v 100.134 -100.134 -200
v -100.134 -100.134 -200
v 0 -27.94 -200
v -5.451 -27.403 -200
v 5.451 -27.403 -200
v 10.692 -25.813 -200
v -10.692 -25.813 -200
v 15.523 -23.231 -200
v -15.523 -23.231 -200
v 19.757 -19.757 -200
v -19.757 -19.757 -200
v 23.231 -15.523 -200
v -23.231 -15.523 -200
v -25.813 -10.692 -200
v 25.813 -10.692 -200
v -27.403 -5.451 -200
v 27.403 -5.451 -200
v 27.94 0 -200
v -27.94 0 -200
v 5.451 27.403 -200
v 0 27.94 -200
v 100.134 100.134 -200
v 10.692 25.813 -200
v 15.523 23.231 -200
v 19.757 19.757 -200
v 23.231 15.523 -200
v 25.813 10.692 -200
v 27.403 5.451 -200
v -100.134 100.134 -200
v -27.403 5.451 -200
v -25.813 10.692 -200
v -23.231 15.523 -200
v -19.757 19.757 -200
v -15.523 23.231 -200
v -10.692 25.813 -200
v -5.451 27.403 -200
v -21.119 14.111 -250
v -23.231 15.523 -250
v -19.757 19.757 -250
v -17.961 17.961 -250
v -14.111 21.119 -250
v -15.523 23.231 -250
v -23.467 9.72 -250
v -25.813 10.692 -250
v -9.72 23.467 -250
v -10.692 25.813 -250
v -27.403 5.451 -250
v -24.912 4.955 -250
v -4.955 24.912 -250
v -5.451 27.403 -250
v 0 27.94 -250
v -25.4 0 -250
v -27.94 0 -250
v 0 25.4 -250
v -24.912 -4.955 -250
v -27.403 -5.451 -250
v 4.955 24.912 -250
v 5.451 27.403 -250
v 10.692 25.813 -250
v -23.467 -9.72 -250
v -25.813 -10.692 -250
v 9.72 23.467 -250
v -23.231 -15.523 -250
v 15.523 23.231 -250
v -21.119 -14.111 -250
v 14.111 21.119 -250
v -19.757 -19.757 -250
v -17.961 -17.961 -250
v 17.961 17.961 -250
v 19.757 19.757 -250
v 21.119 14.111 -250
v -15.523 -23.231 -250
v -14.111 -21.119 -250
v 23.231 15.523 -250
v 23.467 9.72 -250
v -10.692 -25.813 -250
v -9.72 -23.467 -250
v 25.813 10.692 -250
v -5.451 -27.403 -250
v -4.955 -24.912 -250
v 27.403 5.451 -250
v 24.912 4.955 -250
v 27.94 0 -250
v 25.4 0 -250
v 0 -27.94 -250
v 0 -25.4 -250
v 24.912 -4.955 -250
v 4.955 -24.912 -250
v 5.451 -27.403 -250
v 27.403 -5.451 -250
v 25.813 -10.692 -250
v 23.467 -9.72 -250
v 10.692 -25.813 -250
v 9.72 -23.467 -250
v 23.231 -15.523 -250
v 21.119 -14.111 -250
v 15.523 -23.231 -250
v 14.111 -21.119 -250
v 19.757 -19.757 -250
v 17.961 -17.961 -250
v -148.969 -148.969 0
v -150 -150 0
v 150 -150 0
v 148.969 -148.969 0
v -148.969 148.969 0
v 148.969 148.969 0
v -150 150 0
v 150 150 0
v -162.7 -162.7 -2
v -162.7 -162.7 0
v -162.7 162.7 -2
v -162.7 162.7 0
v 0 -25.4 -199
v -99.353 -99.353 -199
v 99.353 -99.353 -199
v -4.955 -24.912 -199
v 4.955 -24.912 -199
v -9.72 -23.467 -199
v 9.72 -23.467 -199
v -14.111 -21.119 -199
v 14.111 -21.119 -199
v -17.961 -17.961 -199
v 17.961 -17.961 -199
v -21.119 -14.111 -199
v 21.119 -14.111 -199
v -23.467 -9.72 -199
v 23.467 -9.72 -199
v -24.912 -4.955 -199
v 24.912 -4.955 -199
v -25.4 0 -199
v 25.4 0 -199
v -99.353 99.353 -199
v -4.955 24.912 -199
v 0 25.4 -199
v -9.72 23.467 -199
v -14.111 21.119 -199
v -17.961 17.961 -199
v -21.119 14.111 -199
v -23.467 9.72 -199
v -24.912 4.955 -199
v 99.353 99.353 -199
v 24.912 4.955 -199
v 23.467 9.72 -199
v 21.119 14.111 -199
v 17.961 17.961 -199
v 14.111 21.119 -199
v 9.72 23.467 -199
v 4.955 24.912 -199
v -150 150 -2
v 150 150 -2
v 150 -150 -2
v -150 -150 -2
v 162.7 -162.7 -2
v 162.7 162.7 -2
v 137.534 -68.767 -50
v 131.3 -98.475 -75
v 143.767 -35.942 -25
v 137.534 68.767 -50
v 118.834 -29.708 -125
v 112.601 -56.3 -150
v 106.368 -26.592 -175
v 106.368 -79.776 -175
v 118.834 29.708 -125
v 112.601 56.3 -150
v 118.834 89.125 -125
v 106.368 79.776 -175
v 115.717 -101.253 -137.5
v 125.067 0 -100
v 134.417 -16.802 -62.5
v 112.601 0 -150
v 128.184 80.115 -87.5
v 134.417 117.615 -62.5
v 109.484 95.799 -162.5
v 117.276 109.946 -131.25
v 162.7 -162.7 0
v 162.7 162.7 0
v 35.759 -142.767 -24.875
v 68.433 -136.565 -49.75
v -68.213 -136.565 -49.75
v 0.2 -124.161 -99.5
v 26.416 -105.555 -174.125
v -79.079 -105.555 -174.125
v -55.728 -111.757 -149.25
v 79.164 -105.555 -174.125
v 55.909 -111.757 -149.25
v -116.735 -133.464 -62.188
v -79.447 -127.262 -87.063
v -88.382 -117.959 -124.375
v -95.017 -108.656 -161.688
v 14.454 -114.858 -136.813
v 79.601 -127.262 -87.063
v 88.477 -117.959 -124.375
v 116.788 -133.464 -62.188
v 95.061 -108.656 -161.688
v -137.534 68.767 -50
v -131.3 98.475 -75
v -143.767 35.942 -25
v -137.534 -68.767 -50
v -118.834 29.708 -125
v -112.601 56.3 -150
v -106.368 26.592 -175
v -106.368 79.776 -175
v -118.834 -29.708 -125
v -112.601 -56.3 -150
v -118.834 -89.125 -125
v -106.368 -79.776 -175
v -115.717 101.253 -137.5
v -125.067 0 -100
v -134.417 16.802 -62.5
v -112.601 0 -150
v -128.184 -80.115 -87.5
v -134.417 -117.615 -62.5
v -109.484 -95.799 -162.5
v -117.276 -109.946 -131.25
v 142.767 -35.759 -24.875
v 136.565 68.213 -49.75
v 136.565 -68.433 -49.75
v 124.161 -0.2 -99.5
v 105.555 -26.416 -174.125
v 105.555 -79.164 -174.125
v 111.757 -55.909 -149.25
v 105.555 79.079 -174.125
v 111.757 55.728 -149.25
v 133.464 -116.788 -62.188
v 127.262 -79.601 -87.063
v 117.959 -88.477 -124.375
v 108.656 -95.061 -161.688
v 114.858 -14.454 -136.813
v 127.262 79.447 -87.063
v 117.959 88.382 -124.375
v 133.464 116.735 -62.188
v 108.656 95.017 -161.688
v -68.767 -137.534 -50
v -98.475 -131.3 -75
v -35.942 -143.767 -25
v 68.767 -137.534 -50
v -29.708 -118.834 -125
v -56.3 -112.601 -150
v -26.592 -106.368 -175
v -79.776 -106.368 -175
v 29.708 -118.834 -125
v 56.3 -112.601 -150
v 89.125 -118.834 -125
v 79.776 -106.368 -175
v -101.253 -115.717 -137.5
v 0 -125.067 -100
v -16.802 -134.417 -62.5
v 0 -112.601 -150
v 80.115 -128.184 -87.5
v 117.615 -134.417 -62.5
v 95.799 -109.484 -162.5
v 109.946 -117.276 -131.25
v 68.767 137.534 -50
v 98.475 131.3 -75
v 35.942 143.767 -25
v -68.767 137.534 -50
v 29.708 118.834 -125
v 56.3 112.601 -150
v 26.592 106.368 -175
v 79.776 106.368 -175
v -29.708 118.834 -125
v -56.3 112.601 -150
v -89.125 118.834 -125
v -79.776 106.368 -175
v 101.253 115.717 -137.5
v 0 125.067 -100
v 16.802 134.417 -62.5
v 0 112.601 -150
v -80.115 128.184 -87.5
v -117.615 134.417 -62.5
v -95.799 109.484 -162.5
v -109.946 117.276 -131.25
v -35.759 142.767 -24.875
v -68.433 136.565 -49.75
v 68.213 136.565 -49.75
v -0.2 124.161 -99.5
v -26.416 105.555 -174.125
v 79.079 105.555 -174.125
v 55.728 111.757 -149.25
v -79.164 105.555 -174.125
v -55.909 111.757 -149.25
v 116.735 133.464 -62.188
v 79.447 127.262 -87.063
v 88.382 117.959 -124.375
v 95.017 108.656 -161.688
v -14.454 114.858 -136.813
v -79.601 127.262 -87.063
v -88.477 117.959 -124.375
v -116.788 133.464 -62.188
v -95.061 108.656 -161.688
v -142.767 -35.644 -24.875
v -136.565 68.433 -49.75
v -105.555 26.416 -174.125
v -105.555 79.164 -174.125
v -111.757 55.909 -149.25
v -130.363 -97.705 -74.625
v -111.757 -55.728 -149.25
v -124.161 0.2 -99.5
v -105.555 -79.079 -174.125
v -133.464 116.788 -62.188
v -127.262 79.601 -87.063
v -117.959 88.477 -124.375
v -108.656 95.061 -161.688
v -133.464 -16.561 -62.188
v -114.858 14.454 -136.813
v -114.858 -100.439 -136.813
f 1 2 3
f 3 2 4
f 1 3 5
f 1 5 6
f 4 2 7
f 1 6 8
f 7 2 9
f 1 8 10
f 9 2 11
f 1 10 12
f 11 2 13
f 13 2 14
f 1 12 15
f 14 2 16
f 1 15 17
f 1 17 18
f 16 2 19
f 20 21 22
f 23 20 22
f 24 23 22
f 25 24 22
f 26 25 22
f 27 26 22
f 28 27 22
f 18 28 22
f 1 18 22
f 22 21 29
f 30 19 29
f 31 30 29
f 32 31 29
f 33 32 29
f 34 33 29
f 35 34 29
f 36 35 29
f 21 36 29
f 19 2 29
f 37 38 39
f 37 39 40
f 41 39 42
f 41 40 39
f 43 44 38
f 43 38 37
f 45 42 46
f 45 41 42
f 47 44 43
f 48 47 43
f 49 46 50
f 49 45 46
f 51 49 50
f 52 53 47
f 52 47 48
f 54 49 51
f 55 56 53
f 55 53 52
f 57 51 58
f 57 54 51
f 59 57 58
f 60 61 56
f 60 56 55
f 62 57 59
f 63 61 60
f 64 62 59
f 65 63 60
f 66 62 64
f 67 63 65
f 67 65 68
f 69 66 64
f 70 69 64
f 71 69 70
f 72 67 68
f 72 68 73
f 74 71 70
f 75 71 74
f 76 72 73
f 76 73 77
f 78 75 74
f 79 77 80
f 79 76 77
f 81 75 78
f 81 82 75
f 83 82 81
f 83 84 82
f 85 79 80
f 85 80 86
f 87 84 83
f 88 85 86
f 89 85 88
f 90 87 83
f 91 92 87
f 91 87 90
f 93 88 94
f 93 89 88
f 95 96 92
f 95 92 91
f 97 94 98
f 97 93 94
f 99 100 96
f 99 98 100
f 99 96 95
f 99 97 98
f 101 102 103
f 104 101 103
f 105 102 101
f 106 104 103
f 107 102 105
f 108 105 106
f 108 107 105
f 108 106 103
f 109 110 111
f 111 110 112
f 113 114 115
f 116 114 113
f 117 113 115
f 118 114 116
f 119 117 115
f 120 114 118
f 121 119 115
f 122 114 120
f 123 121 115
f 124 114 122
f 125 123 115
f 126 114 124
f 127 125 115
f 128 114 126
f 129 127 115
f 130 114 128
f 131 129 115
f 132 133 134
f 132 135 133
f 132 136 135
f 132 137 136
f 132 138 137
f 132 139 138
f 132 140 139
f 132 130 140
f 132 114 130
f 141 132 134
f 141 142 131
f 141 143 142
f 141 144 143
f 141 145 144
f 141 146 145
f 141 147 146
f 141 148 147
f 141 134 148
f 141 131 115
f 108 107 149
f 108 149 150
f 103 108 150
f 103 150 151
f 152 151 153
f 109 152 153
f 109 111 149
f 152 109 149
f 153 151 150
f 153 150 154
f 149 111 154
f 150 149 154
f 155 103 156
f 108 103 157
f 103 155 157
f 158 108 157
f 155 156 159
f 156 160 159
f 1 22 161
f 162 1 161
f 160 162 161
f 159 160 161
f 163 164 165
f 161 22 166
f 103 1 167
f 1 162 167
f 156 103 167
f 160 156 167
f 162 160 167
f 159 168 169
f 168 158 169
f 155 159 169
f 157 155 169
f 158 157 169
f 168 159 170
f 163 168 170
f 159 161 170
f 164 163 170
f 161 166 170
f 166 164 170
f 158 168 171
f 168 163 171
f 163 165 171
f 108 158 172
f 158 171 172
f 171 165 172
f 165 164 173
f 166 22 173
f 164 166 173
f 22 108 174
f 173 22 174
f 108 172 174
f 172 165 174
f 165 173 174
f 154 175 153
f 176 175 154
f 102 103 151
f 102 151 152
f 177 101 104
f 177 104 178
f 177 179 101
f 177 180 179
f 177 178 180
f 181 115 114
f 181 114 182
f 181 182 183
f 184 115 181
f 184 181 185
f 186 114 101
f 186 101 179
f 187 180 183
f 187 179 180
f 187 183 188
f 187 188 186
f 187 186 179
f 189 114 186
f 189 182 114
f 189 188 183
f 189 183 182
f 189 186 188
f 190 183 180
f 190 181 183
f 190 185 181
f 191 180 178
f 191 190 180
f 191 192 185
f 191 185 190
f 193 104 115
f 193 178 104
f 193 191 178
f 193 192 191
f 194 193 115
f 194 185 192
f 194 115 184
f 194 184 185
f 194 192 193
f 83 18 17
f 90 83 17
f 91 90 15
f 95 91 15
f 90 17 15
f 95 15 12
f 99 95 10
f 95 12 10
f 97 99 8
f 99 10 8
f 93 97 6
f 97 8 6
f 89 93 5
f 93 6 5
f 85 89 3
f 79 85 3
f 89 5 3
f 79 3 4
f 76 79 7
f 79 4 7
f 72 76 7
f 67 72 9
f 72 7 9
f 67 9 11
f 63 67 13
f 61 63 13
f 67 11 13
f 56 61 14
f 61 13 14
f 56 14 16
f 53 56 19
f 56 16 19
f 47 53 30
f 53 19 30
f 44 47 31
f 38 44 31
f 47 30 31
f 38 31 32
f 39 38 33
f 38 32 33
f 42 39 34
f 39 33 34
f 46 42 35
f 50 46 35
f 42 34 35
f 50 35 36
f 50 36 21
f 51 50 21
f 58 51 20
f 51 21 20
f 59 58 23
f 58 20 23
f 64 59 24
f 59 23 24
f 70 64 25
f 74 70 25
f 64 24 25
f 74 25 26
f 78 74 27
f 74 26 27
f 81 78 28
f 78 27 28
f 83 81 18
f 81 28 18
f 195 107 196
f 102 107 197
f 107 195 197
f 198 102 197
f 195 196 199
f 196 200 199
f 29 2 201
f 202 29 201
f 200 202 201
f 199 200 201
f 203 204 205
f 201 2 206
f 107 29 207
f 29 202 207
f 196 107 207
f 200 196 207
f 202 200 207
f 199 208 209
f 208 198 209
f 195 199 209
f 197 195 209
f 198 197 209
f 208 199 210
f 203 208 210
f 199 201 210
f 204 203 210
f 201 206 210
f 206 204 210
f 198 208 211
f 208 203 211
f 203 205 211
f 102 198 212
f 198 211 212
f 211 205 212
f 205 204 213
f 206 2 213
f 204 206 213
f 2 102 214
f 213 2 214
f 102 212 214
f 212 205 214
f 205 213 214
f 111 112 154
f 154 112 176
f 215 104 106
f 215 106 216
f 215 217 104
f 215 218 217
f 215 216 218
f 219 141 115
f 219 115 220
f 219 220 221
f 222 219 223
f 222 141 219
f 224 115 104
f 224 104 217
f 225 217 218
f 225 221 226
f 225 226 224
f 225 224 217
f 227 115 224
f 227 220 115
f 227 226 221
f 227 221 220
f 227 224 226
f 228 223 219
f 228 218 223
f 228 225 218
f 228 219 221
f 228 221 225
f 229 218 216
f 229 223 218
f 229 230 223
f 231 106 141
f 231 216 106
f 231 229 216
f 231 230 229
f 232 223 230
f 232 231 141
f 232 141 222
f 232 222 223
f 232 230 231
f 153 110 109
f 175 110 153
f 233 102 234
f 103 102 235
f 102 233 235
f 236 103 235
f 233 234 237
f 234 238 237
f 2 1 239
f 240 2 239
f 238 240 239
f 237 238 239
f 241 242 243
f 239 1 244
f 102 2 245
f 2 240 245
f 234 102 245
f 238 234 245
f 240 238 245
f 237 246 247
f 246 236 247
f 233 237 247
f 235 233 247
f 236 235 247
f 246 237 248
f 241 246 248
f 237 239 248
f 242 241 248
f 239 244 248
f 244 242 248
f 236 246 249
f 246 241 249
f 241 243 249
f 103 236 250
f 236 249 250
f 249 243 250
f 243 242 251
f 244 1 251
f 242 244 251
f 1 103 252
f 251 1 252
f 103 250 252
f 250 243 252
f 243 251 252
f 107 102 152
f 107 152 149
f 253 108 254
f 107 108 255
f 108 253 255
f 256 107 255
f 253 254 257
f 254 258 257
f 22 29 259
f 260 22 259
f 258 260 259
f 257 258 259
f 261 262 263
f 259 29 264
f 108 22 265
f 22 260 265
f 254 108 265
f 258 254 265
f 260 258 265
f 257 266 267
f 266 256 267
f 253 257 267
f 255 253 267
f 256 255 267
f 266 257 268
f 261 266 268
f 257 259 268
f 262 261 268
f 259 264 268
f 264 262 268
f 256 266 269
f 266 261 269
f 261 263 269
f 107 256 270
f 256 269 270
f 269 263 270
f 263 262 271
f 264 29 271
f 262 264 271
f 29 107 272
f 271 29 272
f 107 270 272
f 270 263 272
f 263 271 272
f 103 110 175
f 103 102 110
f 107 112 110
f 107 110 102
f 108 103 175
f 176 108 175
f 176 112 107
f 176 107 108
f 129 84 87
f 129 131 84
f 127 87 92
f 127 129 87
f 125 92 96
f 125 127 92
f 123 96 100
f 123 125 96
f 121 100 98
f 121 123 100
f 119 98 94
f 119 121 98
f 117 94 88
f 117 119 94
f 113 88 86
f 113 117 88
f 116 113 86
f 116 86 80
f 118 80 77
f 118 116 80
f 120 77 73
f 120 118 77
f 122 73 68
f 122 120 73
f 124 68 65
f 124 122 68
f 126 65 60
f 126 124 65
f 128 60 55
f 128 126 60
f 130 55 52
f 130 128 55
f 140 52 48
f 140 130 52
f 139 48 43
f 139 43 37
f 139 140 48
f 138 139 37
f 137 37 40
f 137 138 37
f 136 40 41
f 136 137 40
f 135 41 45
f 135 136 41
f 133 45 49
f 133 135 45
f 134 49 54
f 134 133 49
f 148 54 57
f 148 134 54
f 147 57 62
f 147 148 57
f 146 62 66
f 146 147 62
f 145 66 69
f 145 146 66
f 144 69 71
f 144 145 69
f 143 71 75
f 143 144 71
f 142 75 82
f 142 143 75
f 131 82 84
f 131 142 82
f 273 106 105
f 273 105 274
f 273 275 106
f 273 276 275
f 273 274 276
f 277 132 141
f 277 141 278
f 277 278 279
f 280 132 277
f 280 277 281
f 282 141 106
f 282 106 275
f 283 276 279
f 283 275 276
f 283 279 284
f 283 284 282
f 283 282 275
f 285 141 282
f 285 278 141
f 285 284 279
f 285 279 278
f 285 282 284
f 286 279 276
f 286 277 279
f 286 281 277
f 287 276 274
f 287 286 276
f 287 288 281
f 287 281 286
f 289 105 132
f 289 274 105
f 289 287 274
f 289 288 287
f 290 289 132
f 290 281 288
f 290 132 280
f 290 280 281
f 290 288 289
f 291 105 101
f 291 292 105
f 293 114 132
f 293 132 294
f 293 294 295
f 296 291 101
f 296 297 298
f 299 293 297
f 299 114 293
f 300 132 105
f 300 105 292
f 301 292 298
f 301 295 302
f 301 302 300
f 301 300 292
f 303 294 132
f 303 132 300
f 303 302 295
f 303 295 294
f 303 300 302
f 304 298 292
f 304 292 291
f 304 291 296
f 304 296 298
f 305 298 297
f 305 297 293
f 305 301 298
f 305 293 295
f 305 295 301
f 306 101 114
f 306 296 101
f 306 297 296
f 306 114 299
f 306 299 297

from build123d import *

# Parameters (mm, degrees)
F0_W     = 300
F0_H     = 300
F1_DEPTH = 200
F1_TAPER = 14
F2_T     = -1
F3_R     = 25.4
F4_DEPTH = 25
F5_R     = 27.94
F5_R_2   = 25.4
F6_DEPTH = 50
F7_W     = 325.4
F7_H     = 325.4
F8_DEPTH = 2


with BuildPart() as f1:
    # F0 (on Top) → F1 (new body)
    with BuildSketch(Plane.XY):
        Rectangle(F0_W, F0_H)
    extrude(amount=-F1_DEPTH, taper=F1_TAPER)

    # F2
    f2_openings = [f1.faces().sort_by_distance(p)[0] for p in [
        (0, 0, 0),
    ]]
    offset(amount=F2_T, openings=f2_openings, kind=Kind.INTERSECTION)

    # F3 (on face) → F4 (cut)
    with BuildSketch(Plane.XY.offset(-199)):
        Circle(F3_R)
    extrude(amount=-F4_DEPTH, mode=Mode.SUBTRACT)

    # F5 (on face) → F6 (join)
    with BuildSketch(Plane(origin=(0, 0, -200), x_dir=(1, 0, 0), z_dir=(0, 0, -1))):
        Circle(F5_R)
        Circle(F5_R_2, mode=Mode.SUBTRACT)
    extrude(amount=F6_DEPTH)

    # F7 (on face) → F8 (join)
    with BuildSketch(Plane.XY):
        Rectangle(F7_W, F7_H)
        Polygon((149, -150), (-150, -150), (-150, 149), (-150, 150), (150, 150), (150, -150), align=None, mode=Mode.SUBTRACT)
    extrude(amount=-F8_DEPTH)


solid = f1.part
